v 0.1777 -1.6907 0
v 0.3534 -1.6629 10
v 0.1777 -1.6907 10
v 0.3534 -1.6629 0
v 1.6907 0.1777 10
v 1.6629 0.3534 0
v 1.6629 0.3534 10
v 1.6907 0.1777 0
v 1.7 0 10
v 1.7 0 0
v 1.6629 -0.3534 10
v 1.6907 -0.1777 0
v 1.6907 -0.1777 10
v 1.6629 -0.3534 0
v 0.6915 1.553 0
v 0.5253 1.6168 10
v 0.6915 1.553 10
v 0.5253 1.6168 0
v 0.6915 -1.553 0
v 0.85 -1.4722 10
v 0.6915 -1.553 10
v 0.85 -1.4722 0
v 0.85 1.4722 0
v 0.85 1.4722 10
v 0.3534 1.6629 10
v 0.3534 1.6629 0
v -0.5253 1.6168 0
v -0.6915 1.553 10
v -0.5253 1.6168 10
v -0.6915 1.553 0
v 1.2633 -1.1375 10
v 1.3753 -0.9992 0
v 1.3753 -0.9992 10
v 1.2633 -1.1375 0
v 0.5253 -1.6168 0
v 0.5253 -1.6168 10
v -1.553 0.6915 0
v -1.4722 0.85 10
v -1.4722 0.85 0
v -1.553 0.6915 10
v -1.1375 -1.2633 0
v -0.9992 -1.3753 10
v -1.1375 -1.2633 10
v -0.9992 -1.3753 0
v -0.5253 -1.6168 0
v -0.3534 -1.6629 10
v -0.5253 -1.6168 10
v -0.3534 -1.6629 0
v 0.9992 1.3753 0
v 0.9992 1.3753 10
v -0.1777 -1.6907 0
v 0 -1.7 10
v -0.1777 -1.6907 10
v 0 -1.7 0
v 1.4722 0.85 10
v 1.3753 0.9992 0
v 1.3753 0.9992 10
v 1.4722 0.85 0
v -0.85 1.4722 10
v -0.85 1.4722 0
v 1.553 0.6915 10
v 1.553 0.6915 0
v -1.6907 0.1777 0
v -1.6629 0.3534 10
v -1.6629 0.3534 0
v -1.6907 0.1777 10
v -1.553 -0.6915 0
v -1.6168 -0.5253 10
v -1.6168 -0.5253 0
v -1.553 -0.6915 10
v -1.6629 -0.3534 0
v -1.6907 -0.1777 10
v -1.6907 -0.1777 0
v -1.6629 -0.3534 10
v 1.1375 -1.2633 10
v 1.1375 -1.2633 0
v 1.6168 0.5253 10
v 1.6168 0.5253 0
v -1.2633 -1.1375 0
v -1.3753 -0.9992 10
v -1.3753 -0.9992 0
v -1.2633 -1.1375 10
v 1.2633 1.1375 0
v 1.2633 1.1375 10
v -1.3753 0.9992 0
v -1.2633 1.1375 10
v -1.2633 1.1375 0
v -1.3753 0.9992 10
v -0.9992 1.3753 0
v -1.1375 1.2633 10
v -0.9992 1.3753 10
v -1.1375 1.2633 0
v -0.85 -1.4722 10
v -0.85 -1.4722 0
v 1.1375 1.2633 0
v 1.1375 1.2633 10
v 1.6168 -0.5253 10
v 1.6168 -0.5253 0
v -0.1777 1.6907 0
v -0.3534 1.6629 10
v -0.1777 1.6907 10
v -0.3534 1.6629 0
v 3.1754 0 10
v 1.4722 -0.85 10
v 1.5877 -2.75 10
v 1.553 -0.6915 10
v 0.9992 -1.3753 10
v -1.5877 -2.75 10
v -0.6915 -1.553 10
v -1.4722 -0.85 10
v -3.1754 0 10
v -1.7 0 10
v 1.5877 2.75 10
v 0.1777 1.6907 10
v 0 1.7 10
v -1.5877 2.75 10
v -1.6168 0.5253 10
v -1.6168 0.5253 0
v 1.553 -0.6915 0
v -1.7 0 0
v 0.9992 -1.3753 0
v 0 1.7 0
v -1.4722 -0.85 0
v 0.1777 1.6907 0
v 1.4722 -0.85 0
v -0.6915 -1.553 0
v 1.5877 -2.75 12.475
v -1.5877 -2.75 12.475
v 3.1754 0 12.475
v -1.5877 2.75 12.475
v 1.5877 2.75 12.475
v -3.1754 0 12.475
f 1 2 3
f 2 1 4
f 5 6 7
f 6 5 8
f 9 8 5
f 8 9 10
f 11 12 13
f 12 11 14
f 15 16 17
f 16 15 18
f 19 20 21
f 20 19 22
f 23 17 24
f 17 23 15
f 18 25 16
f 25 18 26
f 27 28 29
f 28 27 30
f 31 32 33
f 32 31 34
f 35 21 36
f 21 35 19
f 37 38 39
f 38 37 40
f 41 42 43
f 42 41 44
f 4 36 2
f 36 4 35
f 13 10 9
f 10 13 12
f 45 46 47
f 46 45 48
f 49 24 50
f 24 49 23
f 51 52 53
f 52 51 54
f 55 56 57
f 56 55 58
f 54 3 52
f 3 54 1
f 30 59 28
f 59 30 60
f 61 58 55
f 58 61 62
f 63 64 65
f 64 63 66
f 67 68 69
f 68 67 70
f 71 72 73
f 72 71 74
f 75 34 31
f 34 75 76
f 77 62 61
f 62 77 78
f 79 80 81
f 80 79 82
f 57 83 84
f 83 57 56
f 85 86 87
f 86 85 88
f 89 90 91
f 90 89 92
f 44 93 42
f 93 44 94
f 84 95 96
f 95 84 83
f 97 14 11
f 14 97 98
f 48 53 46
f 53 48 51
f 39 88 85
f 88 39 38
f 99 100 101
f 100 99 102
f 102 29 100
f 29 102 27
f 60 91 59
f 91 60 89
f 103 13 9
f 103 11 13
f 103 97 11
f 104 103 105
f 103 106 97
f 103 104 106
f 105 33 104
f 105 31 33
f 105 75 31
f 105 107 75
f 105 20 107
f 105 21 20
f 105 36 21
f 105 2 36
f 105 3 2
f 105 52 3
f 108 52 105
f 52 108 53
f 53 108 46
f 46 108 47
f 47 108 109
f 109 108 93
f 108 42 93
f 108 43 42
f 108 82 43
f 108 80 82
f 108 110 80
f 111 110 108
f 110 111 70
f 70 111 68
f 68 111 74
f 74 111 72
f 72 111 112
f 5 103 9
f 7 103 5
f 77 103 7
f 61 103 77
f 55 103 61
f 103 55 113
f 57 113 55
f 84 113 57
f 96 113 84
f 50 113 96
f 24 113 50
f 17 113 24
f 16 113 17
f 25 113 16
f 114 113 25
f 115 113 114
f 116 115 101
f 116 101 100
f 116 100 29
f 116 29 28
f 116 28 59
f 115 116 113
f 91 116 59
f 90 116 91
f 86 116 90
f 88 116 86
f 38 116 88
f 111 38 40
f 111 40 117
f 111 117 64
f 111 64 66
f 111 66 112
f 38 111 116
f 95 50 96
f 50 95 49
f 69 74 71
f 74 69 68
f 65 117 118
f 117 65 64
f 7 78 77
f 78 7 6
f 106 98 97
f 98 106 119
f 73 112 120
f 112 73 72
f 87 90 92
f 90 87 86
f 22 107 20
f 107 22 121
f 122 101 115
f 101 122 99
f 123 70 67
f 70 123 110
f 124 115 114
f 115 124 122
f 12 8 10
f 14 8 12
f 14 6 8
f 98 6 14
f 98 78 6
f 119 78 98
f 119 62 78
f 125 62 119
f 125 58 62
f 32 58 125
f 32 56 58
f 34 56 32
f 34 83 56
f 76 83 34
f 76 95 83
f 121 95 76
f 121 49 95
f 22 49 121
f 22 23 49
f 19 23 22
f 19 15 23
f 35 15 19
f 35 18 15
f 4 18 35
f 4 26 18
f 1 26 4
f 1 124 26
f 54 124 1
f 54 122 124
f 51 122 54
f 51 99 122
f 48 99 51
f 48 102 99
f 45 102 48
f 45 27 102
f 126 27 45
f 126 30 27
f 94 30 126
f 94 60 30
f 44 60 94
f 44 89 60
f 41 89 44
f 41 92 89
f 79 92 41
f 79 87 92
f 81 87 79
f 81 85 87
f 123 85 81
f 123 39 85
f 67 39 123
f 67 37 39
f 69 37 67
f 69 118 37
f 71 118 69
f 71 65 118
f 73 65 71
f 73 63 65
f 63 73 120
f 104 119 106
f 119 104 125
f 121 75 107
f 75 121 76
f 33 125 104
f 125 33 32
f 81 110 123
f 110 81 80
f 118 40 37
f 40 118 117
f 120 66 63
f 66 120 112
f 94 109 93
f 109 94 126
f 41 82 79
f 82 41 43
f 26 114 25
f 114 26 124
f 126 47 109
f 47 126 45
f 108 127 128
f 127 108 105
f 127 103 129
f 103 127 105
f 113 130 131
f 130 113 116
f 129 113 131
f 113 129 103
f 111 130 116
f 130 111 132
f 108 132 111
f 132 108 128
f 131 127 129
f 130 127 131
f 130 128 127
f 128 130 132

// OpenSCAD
// Hex-head bolt.
$fn = 60;
eps = 0.02;
thread_d = 3.4;
flat = 5.5;
shaft_l = 10;
union() { cylinder(d=thread_d,h=shaft_l); translate([0,0,shaft_l]) cylinder(d=flat/cos(30),h=flat*0.45,$fn=6); }
